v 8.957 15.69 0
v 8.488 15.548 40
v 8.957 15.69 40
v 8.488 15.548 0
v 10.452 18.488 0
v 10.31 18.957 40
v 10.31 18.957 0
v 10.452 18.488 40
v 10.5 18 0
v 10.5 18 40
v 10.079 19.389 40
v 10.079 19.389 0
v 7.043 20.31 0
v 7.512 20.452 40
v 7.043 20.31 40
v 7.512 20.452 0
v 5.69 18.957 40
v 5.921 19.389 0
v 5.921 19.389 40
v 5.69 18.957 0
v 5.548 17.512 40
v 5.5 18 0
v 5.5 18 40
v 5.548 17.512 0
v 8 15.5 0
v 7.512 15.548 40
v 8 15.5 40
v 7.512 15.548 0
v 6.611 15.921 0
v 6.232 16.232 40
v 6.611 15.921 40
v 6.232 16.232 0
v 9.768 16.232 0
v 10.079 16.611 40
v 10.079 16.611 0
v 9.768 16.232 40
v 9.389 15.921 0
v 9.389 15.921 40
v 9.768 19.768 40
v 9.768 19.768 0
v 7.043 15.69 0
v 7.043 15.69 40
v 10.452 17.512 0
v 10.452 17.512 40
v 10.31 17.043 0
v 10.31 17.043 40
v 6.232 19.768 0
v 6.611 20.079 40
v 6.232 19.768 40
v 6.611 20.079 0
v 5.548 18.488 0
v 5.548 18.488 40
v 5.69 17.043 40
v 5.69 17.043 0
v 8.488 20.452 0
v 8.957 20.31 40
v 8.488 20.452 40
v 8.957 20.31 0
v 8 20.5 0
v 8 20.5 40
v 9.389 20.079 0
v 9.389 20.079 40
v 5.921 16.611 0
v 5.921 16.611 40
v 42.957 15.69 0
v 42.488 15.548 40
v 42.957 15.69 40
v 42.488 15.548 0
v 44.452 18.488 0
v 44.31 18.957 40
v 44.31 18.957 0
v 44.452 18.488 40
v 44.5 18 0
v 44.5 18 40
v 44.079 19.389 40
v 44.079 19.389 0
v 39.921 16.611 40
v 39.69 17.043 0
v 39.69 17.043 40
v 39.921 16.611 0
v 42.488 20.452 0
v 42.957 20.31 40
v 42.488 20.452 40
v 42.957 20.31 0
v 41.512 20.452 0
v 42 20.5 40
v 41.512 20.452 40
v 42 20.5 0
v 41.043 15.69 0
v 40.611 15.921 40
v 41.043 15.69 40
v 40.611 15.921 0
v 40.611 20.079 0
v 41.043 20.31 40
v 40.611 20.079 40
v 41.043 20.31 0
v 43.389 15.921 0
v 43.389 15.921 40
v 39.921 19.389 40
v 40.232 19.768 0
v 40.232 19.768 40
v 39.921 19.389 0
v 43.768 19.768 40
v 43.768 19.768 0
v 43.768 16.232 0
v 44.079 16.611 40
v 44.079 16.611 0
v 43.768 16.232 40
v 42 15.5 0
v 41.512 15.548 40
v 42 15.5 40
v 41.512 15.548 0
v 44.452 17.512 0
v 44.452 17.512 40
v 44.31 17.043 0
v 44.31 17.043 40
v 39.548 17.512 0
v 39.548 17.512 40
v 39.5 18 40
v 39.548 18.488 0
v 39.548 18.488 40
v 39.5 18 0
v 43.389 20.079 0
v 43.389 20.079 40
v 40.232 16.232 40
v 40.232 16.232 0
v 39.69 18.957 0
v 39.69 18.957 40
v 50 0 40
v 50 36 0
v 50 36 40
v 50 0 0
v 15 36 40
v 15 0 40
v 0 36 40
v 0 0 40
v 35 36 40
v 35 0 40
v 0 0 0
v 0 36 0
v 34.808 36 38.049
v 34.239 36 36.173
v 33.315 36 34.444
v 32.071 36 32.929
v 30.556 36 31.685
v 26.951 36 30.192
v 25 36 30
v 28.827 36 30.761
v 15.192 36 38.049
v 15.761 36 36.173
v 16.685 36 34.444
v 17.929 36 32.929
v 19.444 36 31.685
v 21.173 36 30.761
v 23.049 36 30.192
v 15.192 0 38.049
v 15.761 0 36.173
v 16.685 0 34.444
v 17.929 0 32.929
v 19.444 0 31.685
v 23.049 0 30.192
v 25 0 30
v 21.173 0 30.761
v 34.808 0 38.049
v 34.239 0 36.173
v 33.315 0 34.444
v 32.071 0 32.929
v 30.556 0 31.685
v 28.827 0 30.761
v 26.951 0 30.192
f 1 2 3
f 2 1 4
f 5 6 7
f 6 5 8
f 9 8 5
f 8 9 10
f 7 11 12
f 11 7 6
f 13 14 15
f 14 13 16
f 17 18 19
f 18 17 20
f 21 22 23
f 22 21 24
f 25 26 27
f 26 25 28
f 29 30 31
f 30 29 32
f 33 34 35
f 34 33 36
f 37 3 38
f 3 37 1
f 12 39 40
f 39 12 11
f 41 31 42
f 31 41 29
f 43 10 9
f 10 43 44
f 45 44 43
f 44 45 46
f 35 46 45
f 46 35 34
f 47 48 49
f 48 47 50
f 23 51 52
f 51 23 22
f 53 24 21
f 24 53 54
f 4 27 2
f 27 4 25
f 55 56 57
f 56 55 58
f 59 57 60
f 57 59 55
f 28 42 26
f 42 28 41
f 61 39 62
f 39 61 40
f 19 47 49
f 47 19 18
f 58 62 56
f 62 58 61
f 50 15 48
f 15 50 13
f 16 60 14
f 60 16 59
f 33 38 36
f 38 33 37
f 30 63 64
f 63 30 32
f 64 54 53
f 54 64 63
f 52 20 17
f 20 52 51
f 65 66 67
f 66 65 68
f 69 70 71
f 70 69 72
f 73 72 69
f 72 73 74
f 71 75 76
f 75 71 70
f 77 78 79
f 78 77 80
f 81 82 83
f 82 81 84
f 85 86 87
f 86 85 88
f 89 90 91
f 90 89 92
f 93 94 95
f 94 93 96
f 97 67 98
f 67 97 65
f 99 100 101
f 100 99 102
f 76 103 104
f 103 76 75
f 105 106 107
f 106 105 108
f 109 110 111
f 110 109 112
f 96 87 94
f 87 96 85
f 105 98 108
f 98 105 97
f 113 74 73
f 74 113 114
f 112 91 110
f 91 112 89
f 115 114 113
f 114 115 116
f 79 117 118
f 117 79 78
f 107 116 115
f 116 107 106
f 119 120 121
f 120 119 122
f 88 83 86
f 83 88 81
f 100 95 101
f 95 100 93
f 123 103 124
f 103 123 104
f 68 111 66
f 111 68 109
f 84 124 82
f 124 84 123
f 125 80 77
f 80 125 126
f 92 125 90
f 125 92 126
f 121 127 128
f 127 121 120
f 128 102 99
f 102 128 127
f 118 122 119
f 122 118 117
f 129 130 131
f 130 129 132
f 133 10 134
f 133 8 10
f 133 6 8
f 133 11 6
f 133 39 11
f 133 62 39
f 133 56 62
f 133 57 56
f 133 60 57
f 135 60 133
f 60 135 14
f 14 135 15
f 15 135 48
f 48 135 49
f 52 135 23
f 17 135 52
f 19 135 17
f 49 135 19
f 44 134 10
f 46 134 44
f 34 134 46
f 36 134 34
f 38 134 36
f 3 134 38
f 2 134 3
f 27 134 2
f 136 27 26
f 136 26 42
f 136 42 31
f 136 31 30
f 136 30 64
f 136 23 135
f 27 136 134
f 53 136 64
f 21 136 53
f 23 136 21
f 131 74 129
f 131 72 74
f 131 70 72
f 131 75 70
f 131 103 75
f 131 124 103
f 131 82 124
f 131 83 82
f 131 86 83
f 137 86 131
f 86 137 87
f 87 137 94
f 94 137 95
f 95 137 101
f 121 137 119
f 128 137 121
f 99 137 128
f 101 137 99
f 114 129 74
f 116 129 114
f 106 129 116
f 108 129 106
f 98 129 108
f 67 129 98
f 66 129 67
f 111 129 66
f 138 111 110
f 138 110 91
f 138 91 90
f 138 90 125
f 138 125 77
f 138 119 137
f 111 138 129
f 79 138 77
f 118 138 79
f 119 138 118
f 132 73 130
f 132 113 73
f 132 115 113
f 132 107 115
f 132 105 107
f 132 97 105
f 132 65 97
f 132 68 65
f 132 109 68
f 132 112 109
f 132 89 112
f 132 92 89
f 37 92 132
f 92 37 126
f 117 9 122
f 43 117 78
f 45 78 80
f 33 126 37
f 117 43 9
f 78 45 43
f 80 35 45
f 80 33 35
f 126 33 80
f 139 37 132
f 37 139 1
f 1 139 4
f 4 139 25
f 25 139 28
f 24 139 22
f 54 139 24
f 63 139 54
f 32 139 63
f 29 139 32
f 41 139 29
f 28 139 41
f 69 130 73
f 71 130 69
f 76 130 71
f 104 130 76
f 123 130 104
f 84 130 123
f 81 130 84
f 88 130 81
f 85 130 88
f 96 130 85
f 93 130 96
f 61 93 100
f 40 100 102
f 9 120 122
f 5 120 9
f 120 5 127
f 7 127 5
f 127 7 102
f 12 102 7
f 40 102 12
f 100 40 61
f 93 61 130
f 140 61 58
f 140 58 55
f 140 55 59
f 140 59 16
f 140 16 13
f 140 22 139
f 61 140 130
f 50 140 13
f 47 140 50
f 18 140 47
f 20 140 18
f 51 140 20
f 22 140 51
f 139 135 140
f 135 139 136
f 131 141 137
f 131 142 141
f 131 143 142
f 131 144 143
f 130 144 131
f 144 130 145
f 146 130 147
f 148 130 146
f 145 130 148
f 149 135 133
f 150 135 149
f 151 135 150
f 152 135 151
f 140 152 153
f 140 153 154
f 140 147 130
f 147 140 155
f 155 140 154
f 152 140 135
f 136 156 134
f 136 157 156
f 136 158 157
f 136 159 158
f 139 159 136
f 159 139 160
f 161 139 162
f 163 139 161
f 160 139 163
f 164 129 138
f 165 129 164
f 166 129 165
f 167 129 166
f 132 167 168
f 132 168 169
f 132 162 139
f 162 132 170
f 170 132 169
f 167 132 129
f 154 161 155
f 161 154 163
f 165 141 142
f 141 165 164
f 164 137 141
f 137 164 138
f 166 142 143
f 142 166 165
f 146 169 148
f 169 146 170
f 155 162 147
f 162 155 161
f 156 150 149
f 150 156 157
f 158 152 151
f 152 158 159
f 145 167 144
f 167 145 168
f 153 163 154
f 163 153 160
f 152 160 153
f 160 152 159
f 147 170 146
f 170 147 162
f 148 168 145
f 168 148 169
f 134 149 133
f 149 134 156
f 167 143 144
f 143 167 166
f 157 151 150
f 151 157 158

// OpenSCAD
$fn = 32;

// ----------------------------------------------------------------------
// Saddle clamp: plain shaft clamp
// ----------------------------------------------------------------------

// --- parameters (mm) ---
blk_l = 50;               // block length, X
blk_w = 36;               // block width, Y
blk_h = 40;               // block height
clamp_r = 10;             // shaft groove radius
hole_r = 2.5;             // bolt hole radius
hole_m = 8;               // bolt hole margin from the ends
fit_tol = 0.02;           // tolerance for press fits, mm
free_tol = 0.2;           // tolerance for clearance fits, mm

saw_depth = clamp_r + 3;  // saw kerf depth

difference() {
  cube([blk_l, blk_w, blk_h]);
  translate([blk_l / 2, -1, blk_h])
    rotate([-90, 0, 0])
      cylinder(h = blk_w + 2, r = clamp_r);
  for (sx = [0, 1])
    translate([sx ? blk_l - hole_m : hole_m, blk_w / 2, -1])
      cylinder(r = hole_r, h = blk_h + 2);
}
